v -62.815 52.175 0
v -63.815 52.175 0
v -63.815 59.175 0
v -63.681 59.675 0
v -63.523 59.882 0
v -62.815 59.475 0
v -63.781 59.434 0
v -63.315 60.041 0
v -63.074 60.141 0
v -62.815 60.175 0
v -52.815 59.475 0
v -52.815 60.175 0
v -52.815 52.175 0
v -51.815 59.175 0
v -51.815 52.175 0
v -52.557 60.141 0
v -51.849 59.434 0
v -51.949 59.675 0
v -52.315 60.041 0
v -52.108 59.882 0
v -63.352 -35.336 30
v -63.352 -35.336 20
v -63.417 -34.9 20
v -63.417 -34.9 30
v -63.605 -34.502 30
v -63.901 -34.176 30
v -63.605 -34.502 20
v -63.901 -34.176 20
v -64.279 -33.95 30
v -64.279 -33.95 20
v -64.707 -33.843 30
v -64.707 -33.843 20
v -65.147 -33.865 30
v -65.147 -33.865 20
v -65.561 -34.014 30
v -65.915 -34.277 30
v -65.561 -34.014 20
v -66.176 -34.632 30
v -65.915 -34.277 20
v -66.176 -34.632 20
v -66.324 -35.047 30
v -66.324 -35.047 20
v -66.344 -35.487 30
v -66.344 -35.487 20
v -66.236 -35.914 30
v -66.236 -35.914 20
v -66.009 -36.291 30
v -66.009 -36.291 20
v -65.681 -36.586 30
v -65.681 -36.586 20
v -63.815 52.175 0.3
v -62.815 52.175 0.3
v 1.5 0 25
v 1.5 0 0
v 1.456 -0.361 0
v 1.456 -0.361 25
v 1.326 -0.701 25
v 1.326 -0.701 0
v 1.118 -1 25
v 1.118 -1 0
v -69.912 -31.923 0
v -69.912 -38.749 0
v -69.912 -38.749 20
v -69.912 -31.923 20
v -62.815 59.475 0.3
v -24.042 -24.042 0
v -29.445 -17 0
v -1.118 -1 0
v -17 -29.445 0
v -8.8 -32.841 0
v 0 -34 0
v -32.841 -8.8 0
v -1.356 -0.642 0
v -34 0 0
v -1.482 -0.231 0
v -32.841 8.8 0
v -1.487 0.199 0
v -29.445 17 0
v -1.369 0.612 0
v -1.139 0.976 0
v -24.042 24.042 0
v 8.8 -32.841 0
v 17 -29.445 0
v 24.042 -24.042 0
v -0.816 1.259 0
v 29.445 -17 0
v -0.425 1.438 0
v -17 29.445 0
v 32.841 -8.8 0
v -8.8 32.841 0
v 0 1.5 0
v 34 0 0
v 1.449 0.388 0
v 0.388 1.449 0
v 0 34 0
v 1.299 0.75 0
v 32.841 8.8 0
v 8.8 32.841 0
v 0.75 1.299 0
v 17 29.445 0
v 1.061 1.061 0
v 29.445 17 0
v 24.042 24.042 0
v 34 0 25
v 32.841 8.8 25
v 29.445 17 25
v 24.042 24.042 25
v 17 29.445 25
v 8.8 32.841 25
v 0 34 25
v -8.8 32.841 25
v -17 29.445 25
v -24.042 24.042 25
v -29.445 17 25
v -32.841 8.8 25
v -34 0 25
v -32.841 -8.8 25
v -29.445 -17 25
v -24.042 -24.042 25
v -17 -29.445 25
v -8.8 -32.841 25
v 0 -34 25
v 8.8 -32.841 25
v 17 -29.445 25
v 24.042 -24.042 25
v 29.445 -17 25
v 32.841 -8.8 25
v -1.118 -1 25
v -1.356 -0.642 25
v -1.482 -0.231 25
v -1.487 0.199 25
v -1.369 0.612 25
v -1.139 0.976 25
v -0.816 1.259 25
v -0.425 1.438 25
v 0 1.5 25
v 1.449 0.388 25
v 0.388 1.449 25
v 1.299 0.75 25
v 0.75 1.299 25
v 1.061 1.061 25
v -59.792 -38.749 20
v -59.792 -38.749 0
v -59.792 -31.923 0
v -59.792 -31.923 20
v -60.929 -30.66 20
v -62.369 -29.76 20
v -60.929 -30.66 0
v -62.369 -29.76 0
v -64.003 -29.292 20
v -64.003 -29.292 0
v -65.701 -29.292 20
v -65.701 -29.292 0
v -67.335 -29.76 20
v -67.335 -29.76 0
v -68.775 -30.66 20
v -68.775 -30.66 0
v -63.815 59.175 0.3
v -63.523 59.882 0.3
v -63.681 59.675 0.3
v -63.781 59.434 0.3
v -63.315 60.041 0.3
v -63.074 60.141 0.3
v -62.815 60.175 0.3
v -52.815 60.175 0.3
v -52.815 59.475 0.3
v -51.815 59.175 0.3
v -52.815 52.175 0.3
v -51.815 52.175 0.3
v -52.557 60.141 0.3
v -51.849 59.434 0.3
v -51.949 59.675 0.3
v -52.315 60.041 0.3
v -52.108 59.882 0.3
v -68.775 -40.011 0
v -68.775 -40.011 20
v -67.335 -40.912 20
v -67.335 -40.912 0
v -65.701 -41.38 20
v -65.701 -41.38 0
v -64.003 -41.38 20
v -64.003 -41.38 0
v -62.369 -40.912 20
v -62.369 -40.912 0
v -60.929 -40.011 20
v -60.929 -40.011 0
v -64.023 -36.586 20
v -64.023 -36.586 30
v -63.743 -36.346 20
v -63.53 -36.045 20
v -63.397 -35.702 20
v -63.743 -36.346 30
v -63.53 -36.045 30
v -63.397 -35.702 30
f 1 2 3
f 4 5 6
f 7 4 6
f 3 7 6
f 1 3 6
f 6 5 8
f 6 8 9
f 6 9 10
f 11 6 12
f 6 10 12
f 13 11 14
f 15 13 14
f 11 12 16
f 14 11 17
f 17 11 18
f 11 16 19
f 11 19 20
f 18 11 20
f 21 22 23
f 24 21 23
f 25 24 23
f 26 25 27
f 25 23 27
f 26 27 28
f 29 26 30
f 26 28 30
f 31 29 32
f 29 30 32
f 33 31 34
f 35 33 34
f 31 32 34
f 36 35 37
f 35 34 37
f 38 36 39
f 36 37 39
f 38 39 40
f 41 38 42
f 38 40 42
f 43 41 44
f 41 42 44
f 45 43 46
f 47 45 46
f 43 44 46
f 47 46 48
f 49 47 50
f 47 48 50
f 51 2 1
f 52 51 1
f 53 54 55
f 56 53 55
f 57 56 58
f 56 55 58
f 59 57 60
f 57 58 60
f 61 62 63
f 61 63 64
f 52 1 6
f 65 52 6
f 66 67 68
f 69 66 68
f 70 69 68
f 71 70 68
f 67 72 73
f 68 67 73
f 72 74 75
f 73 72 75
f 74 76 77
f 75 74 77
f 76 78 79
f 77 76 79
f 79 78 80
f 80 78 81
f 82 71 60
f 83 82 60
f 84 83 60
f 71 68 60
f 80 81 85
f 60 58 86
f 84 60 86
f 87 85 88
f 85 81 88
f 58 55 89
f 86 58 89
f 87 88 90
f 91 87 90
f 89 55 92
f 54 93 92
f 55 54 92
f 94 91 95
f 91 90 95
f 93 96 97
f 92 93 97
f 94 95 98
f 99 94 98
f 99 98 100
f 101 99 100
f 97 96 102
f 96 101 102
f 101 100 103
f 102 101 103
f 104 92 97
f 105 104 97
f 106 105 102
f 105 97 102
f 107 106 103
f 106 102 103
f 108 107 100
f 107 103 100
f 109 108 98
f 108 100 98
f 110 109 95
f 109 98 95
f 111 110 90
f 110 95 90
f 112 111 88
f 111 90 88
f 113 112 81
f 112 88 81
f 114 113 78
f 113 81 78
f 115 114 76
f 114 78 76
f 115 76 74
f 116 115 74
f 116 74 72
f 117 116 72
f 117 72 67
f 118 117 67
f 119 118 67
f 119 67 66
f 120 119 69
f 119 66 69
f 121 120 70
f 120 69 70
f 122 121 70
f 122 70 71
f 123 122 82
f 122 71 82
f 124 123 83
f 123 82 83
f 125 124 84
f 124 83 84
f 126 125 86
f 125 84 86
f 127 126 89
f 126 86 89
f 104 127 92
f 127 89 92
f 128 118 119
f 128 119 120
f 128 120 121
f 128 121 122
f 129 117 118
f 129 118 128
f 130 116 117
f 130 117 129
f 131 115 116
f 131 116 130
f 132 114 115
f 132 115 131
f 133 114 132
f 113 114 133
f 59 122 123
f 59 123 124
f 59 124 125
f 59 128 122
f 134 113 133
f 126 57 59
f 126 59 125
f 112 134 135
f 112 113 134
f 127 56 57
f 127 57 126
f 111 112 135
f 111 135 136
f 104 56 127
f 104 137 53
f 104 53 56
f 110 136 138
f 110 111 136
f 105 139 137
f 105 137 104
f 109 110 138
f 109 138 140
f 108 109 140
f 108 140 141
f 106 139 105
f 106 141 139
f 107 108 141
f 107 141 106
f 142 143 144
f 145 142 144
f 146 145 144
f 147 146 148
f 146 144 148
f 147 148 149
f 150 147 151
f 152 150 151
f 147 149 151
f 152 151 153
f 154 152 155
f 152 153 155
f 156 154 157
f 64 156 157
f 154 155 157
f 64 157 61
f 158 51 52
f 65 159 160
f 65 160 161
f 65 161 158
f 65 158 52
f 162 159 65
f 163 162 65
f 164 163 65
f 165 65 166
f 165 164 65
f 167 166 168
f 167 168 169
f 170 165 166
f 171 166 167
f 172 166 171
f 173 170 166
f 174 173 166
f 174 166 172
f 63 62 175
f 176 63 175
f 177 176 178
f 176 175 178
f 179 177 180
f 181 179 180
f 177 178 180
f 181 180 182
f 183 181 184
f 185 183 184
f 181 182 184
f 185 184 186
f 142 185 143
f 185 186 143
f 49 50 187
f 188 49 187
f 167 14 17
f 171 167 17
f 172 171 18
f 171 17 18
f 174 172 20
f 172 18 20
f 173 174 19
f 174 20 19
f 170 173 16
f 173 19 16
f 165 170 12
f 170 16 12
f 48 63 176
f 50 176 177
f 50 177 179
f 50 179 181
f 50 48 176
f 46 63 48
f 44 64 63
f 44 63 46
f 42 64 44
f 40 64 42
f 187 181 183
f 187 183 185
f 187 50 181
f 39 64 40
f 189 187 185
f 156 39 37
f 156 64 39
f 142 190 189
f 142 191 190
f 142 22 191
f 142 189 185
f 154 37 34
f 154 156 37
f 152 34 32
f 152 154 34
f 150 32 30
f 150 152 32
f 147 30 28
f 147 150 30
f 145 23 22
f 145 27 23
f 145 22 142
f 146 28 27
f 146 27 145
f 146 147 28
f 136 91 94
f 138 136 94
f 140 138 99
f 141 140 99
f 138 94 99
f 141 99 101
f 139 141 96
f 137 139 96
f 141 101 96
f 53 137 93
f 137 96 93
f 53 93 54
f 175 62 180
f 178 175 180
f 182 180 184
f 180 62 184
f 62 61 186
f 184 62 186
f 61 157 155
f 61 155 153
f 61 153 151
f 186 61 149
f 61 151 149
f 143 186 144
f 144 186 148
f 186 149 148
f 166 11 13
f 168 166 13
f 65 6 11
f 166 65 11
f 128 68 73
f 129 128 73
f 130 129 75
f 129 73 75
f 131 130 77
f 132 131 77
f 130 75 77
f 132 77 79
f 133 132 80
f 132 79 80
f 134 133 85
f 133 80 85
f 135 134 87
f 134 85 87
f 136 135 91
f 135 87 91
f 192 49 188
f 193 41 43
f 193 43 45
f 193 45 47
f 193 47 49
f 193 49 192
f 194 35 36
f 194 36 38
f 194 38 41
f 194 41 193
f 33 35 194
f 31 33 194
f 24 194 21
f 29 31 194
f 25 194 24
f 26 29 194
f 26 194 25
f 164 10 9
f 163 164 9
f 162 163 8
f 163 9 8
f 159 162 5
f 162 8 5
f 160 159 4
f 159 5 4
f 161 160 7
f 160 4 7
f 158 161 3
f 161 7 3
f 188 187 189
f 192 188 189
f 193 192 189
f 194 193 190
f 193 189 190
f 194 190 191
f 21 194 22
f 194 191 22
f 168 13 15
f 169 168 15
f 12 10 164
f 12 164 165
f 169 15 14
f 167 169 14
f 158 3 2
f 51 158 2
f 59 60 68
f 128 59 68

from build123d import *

# Parameters (mm, degrees)
F0_R     = 34
F1_DEPTH = 25
F2_W     = 10.1202055069
F2_H     = 6.8258544885
F3_DEPTH = 20
F5_DEPTH = 10
F6_W     = 10
F6_H     = 0.7
F7_DEPTH = 0.3
F9_DEPTH = 8


with BuildPart() as f1:
    # F0 (on Top) → F1 (new body)
    with BuildSketch(Plane.XY):
        Circle(F0_R)
        with BuildLine():
            ThreePointArc((0, 1.5), (1.0606601718, 1.0606601718), (1.5, 0))
            ThreePointArc((1.5, 0), (1.4012585384, -0.5352331347), (1.1180339887, -1))
            ThreePointArc((1.1180339887, -1), (0, -1.5), (-1.1180339887, -1))
            ThreePointArc((-1.1180339887, -1), (-1.3693063938, 0.6123724357), (0, 1.5))
        make_face(mode=Mode.SUBTRACT)
        with BuildLine():
            ThreePointArc((-1.1180339887, -1), (0, -1.5), (1.1180339887, -1))
            Line((1.1180339887, -1), (0, -1))
            Line((0, -1), (-1.1180339887, -1))
        make_face()
    extrude(amount=F1_DEPTH)

    # F8 (on face) → F9 (cut)
    with BuildSketch(Plane.XZ.offset(-52.1748177707)):
        with BuildLine():
            ThreePointArc((-63.1654030268, 0.15), (-63.2093370096, 0.2560660172), (-63.3154030268, 0.3))
            Line((-63.3154030268, 0.3), (-63.3154030268, 0))
            ThreePointArc((-63.3154030268, 0), (-63.2093370096, 0.0439339828), (-63.1654030268, 0.15))
        make_face()
        with BuildLine():
            Line((-63.3154030268, 0), (-63.3154030268, 0.3))
            ThreePointArc((-63.3154030268, 0.3), (-63.4654030268, 0.15), (-63.3154030268, 0))
        make_face()
    extrude(amount=F9_DEPTH, mode=Mode.SUBTRACT)


with BuildPart() as f3:
    # F2 (on Top) → F3 (new body)
    with BuildSketch(Plane.XY):
        with BuildLine():
            Line((-69.9120647834, -31.9230046827), (-59.7918592765, -31.9230046827))
            ThreePointArc((-59.7918592765, -31.9230046827), (-64.8519620299, -29.232431927), (-69.9120647834, -31.9230046827))
        make_face()
        with Locations((-64.8519620299, -35.335931927)):
            Rectangle(F2_W, F2_H)
        with BuildLine():
            ThreePointArc((-69.9120647834, -38.7488591712), (-64.8519620299, -41.439431927), (-59.7918592765, -38.7488591712))
            Line((-59.7918592765, -38.7488591712), (-69.9120647834, -38.7488591712))
        make_face()
    extrude(amount=F3_DEPTH)

    # F4 (on face) → F5 (join)
    with BuildSketch(Plane.XY.offset(20)):
        with BuildLine():
            ThreePointArc((-64.0228058323, -36.585931927), (-63.5302710115, -36.0452505097), (-63.3519620299, -35.335931927))
            ThreePointArc((-63.3519620299, -35.335931927), (-65.5612806127, -34.0142409085), (-65.6811182275, -36.585931927))
            Line((-65.6811182275, -36.585931927), (-65.605327487, -36.585931927))
            Line((-65.605327487, -36.585931927), (-64.8519620299, -36.585931927))
            Line((-64.8519620299, -36.585931927), (-64.0228058323, -36.585931927))
        make_face()
    extrude(amount=F5_DEPTH)


with BuildPart() as f7:
    # F6 (on Top) → F7 (new body)
    with BuildSketch(Plane.XY):
        with BuildLine():
            Line((-62.8154030268, 59.4748177707), (-62.8154030268, 60.1748177707))
            ThreePointArc((-62.8154030268, 60.1748177707), (-63.5225098079, 59.8819245519), (-63.8154030268, 59.1748177707))
            Line((-63.8154030268, 59.1748177707), (-63.8154030268, 52.1748177707))
            Line((-63.8154030268, 52.1748177707), (-62.8154030268, 52.1748177707))
            Line((-62.8154030268, 52.1748177707), (-62.8154030268, 59.4748177707))
        make_face()
        with BuildLine():
            ThreePointArc((-51.8154030268, 59.1748177707), (-52.1082962456, 59.8819245519), (-52.8154030268, 60.1748177707))
            Line((-52.8154030268, 60.1748177707), (-52.8154030268, 59.4748177707))
            Line((-52.8154030268, 59.4748177707), (-52.8154030268, 52.1748177707))
            Line((-52.8154030268, 52.1748177707), (-51.8154030268, 52.1748177707))
            Line((-51.8154030268, 52.1748177707), (-51.8154030268, 59.1748177707))
        make_face()
        with Locations((-57.8154030268, 59.8248177707)):
            Rectangle(F6_W, F6_H)
    extrude(amount=F7_DEPTH)


solid = Compound([f1.part, f3.part, f7.part])
